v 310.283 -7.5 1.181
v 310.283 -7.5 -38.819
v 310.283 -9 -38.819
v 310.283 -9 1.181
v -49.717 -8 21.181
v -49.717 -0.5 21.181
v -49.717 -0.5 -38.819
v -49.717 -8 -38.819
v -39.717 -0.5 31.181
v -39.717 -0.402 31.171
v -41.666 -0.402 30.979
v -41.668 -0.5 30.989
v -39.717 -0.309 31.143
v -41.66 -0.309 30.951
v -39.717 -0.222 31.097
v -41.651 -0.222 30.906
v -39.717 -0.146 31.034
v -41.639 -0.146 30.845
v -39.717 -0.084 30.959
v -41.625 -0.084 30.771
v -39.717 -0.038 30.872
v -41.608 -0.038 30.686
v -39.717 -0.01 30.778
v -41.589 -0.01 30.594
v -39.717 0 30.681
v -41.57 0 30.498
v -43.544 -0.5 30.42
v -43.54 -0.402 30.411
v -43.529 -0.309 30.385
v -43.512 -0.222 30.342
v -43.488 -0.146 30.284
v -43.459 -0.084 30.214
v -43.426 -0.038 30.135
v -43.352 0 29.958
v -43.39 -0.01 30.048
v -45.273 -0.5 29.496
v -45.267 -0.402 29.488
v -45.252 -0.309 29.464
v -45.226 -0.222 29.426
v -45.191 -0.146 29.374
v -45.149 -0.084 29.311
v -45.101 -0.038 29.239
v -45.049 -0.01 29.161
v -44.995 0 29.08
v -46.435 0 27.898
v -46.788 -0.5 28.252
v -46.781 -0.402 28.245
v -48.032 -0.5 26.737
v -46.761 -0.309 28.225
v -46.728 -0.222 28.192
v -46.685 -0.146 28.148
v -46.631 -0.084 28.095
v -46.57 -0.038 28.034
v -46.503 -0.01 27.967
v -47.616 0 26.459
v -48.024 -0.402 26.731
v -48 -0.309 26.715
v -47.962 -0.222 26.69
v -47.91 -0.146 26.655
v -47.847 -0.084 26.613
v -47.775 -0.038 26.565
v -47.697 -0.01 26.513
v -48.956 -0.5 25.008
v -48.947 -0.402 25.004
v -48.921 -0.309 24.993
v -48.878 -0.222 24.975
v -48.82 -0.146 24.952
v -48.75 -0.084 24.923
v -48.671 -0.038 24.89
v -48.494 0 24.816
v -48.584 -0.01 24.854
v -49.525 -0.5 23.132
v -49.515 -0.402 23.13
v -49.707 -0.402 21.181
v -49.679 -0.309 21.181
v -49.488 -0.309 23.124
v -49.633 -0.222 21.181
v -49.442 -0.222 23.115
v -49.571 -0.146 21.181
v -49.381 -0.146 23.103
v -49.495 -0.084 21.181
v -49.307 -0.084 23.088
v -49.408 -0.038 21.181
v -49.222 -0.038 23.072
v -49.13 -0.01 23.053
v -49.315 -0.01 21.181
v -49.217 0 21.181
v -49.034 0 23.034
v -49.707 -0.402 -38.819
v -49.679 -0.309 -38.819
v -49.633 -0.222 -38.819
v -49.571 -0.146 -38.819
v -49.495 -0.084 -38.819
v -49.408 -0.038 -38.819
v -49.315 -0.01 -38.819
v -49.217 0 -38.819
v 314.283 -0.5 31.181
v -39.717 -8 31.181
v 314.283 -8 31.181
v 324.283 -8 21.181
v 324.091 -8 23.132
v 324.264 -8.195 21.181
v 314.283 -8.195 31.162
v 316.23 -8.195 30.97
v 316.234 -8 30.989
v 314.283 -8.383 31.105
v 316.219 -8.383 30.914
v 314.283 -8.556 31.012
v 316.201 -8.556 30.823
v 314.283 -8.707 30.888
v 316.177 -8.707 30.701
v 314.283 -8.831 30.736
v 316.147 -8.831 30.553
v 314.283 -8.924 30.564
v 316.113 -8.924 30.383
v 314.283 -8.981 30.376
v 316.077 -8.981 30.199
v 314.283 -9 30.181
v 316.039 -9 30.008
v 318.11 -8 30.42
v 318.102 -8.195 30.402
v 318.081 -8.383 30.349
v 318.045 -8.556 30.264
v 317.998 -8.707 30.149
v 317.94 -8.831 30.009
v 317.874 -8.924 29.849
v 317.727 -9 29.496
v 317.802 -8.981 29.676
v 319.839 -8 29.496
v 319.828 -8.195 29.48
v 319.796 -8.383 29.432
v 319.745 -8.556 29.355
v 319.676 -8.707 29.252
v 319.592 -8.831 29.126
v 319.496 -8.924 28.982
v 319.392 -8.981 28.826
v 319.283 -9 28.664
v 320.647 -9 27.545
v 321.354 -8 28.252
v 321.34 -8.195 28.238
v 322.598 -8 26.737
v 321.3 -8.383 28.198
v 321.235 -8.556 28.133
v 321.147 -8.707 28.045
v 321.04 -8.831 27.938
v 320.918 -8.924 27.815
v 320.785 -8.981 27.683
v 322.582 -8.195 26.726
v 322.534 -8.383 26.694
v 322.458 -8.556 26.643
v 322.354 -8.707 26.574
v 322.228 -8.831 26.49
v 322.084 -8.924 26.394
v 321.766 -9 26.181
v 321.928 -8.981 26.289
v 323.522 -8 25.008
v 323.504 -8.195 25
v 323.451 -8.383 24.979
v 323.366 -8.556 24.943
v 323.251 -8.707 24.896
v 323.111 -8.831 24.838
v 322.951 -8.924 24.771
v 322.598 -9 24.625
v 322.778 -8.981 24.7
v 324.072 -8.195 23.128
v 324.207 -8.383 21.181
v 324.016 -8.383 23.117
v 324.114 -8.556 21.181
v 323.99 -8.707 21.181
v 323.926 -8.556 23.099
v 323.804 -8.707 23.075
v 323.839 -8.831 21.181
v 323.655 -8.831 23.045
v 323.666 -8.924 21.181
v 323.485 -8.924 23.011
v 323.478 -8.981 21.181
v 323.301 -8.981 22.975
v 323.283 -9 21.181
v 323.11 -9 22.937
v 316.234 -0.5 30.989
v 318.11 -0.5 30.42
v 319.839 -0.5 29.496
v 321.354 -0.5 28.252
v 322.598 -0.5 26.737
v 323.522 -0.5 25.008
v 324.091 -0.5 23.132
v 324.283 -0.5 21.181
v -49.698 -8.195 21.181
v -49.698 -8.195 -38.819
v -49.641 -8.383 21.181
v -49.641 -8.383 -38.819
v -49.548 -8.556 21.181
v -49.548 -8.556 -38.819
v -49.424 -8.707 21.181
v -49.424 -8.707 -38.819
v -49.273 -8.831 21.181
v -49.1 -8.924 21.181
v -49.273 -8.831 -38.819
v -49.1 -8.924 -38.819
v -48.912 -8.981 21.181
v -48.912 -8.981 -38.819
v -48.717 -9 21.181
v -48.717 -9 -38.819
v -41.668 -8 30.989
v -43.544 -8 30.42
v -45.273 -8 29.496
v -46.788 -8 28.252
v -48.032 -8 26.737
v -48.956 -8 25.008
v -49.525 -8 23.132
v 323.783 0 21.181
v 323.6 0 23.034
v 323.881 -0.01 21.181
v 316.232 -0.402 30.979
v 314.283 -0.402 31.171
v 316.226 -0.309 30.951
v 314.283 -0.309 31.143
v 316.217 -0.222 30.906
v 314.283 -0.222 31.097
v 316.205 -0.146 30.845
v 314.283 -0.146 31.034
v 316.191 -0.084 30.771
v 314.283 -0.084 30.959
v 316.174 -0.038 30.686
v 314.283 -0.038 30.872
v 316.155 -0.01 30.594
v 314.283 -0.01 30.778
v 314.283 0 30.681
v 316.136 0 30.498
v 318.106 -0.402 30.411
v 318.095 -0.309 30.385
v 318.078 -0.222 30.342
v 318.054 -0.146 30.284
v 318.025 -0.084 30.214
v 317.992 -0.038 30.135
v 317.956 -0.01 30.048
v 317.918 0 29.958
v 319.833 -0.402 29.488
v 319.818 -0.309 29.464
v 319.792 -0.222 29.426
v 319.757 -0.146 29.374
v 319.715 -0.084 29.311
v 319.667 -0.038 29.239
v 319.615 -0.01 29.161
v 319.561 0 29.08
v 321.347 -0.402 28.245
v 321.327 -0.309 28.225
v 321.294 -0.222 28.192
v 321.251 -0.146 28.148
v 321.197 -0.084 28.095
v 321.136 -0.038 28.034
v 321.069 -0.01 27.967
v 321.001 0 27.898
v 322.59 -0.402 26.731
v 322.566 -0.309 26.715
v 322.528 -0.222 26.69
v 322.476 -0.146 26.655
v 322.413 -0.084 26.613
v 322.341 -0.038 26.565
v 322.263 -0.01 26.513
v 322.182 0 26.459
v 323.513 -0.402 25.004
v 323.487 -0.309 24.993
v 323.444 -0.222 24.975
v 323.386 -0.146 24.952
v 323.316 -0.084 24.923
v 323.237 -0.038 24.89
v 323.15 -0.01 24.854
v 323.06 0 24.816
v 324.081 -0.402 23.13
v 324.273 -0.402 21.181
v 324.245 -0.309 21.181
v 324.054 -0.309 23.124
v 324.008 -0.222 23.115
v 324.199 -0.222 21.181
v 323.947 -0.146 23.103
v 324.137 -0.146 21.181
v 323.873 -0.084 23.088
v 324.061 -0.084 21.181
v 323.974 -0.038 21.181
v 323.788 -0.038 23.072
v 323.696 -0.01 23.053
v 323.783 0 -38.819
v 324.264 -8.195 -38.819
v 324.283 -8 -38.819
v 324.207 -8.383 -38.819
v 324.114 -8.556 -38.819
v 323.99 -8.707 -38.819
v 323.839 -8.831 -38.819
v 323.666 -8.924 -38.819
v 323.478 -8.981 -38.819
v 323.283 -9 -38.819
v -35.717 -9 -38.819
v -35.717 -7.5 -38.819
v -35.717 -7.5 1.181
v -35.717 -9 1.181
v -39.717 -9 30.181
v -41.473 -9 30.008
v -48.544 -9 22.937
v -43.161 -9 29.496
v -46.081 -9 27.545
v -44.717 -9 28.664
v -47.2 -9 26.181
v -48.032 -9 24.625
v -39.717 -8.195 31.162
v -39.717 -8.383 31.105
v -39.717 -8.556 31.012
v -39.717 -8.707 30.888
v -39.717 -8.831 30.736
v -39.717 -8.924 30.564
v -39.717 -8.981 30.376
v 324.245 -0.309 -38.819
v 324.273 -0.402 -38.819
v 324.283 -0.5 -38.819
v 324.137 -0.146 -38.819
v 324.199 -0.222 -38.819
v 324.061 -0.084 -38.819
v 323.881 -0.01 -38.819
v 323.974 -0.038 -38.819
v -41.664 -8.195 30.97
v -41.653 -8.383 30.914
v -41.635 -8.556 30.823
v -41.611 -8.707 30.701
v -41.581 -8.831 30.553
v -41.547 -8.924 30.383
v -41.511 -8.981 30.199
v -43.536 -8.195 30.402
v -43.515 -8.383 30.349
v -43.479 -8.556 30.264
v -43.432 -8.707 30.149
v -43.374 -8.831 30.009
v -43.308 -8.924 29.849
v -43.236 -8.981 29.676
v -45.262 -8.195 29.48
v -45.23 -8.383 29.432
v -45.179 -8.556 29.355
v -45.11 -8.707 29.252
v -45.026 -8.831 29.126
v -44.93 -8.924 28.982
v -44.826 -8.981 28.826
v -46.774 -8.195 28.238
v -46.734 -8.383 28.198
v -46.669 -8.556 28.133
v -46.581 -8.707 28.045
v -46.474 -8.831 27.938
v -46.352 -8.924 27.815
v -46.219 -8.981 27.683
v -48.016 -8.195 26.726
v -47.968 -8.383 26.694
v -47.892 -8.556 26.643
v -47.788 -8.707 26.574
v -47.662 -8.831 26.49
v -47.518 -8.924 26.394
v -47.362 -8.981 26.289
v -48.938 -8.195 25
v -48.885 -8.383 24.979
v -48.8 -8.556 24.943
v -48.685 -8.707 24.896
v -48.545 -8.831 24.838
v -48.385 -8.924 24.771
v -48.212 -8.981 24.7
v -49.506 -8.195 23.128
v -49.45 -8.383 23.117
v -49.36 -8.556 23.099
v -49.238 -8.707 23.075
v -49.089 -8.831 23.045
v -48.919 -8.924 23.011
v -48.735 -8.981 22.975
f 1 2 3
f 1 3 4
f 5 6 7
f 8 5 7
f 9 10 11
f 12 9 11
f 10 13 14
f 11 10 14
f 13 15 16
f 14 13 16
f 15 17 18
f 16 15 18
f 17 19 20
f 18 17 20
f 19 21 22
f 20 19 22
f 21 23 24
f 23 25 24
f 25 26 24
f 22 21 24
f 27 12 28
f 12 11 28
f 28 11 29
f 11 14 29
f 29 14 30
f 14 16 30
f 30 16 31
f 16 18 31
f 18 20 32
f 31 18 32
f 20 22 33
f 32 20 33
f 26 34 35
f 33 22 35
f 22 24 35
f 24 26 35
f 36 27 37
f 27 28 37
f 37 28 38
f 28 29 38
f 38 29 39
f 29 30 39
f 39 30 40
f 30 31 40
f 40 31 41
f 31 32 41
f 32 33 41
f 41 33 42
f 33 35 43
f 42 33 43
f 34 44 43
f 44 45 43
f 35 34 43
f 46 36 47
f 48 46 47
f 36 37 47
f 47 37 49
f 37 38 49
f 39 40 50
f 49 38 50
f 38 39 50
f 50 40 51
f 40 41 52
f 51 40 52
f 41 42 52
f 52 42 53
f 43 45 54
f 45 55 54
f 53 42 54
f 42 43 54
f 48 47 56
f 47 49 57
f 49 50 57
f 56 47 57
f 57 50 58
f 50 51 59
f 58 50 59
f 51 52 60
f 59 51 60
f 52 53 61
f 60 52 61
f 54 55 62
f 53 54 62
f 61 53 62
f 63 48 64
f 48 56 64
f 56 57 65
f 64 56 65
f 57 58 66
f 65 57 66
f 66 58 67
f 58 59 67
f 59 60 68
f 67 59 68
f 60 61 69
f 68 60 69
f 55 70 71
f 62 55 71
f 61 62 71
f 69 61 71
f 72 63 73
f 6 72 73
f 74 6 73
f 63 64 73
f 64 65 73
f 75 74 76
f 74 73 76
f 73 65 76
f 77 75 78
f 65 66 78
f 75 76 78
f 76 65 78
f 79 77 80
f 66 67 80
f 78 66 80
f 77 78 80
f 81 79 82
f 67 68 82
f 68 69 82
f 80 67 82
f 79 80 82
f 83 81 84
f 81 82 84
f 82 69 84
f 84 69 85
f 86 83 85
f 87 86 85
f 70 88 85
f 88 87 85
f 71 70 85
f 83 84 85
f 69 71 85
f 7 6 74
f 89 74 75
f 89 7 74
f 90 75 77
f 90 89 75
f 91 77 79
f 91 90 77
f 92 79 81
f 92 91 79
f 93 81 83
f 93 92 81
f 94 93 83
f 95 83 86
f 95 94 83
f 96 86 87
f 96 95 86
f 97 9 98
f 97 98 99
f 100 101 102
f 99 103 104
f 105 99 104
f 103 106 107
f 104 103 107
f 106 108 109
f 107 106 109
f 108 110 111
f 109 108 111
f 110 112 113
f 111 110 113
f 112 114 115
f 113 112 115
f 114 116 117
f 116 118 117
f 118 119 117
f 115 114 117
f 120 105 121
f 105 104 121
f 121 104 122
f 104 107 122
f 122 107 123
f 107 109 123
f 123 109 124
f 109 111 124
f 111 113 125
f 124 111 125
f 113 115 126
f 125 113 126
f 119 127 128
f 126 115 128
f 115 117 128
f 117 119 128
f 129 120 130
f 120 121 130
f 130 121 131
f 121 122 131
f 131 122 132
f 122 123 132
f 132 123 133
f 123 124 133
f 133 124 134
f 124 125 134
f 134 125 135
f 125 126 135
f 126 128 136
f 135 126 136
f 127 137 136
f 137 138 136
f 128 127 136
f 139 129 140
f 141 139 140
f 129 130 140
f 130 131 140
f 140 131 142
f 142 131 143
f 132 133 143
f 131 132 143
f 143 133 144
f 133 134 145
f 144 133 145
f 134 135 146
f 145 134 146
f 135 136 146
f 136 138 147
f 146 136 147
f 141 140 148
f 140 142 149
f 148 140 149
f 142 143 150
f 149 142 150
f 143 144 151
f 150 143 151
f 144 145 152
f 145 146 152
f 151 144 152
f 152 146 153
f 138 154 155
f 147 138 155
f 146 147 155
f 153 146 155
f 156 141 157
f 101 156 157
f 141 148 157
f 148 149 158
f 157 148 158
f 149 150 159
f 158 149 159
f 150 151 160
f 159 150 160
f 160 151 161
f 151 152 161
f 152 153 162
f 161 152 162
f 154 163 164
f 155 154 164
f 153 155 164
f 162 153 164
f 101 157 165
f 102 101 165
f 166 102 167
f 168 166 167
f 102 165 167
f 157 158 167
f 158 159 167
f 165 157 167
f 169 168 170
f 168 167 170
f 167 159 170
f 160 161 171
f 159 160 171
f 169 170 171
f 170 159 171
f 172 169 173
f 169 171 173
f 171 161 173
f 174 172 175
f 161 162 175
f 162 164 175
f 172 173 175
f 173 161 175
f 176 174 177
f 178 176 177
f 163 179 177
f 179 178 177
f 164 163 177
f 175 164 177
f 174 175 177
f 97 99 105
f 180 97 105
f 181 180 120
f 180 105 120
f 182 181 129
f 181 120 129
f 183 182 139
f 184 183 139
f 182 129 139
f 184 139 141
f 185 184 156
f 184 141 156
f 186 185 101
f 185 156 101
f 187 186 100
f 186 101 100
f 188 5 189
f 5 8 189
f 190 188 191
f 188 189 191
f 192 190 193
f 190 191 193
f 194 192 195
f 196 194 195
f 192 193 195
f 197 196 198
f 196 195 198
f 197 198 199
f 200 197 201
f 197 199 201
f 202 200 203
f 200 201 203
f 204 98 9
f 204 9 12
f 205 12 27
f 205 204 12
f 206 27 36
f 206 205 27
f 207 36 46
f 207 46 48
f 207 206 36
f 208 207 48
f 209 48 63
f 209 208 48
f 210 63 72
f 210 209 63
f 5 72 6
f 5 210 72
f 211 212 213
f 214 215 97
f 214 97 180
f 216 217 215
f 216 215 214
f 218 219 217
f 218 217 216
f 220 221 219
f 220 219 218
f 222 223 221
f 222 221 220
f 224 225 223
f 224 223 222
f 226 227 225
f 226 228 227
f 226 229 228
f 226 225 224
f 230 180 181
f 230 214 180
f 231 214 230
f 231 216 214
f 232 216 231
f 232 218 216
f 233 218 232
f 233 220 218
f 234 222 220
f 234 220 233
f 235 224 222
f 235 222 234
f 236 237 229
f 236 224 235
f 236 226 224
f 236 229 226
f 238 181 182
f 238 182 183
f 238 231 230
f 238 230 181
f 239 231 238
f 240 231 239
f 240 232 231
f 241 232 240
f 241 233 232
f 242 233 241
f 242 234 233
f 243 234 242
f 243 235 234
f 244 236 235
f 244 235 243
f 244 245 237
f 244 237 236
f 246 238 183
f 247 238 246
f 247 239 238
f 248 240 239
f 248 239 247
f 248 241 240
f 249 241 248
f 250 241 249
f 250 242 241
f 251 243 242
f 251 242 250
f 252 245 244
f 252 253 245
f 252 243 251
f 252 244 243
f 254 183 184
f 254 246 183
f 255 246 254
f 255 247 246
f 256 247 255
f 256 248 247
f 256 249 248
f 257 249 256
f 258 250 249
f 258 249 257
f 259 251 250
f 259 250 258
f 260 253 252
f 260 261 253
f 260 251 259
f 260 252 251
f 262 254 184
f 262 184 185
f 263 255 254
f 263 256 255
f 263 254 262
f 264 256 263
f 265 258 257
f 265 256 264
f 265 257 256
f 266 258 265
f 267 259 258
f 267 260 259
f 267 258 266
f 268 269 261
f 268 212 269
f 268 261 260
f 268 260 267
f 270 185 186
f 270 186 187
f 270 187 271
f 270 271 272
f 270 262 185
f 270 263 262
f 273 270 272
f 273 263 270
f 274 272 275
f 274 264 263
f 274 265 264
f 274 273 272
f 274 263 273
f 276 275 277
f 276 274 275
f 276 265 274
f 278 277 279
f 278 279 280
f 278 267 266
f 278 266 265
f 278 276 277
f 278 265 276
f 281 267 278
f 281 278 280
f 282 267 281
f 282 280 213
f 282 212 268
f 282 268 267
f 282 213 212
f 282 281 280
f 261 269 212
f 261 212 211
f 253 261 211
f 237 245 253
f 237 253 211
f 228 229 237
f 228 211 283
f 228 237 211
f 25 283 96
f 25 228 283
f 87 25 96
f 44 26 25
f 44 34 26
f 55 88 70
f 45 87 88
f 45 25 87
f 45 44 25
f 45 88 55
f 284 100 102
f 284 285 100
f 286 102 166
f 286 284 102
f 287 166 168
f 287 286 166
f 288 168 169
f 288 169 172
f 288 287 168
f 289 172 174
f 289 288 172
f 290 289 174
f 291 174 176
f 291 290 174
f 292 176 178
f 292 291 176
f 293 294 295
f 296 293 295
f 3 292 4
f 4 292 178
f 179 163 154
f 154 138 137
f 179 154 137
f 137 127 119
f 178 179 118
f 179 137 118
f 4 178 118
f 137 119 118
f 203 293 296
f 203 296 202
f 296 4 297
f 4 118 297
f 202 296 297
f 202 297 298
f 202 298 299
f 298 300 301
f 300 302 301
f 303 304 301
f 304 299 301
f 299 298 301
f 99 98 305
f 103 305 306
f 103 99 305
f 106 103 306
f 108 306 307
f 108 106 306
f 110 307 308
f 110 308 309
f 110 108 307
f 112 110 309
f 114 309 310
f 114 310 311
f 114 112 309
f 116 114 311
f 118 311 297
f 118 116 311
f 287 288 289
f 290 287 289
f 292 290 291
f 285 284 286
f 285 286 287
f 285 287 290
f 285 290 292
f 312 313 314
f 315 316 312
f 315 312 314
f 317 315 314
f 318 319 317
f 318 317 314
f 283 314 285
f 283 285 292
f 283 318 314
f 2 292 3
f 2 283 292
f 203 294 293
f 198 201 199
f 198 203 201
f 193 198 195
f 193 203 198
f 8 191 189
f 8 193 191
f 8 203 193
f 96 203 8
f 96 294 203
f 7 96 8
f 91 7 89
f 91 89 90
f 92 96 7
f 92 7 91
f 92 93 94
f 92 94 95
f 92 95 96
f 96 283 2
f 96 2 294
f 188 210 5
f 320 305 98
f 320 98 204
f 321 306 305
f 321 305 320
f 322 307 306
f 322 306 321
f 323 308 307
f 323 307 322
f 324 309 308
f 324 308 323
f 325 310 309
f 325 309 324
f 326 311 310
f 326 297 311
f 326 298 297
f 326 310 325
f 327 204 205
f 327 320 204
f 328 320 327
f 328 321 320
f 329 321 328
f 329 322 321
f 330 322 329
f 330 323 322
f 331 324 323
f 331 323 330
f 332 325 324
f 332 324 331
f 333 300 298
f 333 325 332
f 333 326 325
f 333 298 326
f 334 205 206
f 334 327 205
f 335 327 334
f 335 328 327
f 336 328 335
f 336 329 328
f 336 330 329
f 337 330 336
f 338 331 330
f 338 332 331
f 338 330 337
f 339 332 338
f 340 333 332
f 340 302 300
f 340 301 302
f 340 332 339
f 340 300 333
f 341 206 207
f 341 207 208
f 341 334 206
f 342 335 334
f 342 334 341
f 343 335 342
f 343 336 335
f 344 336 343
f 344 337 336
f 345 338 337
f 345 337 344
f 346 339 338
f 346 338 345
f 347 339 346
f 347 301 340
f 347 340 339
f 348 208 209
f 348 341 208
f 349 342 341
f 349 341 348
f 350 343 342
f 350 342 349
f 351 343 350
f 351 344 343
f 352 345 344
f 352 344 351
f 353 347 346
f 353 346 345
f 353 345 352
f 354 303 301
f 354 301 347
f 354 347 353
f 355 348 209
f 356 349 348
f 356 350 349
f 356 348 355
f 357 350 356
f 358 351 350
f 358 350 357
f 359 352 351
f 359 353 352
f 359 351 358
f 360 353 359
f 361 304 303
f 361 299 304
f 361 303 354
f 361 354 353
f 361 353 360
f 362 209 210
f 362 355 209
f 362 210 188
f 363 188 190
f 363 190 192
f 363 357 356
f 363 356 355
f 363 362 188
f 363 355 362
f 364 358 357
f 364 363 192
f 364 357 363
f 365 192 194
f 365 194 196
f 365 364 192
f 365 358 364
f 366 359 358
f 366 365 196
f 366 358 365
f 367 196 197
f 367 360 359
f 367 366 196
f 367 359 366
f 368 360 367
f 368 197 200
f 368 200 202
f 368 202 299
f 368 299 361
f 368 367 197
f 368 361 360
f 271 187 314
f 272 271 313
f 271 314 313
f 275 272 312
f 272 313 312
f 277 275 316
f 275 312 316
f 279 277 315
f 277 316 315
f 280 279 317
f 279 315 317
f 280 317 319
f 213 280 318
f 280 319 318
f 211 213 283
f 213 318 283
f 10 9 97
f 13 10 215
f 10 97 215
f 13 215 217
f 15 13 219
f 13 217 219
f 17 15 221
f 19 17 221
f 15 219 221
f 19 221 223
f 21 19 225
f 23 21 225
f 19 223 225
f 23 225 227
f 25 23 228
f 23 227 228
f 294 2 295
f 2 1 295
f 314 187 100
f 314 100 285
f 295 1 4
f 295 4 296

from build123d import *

# Parameters (mm, degrees)
F1_DEPTH = 9
F0_W     = 173
F0_H     = 40
F2_DEPTH = 7.5
F3_R     = 10
F4_R     = 1
F5_R     = 0.5


with BuildPart() as f1:
    # F0 (on Front) → F1 (new body)
    with BuildSketch(Plane.XZ):
        Polygon((137.2830025838, 31.1808919907), (-49.7169974162, 31.1808919907), (-49.7169974162, -38.8191080093), (-35.7169974162, -38.8191080093), (-35.7169974162, 1.1808919907), (137.2830025838, 1.1808919907), align=None)
    extrude(amount=F1_DEPTH)

    # F0 (on Front) → F2 (join)
    with BuildSketch(Plane.XZ):
        Polygon((137.2830025838, 31.1808919907), (-49.7169974162, 31.1808919907), (-49.7169974162, -38.8191080093), (-35.7169974162, -38.8191080093), (-35.7169974162, 1.1808919907), (137.2830025838, 1.1808919907), align=None)
        with Locations((50.7830025838, -18.8191080093)):
            Rectangle(F0_W, F0_H)
    extrude(amount=F2_DEPTH)

    # F3
    f3_edges = [f1.edges().sort_by_distance(p)[0] for p in [
        (-49.716997, -4.5, 31.180892),
    ]]
    fillet(f3_edges, radius=F3_R)

    # F4
    f4_edges = [f1.edges().sort_by_distance(p)[0] for p in [
        (48.783003, -9, 31.180892),
        (-46.788065, -9, 28.25196),
        (-49.716997, -9, -8.819108),
    ]]
    fillet(f4_edges, radius=F4_R)

    # F5
    f5_edges = [f1.edges().sort_by_distance(p)[0] for p in [
        (48.783003, 0, 31.180892),
        (-46.788065, 0, 28.25196),
        (-49.716997, 0, -8.819108),
    ]]
    fillet(f5_edges, radius=F5_R)

    # F6: F1 across face


with BuildPart() as f1_1:
    add(f1.part)
    add(f1.part.mirror(Plane(origin=(137.2830025838, -4.1038796524, -2.2558019442), x_dir=(0, 1, 0), z_dir=(1, 0, 0))))


solid = f1_1.part
